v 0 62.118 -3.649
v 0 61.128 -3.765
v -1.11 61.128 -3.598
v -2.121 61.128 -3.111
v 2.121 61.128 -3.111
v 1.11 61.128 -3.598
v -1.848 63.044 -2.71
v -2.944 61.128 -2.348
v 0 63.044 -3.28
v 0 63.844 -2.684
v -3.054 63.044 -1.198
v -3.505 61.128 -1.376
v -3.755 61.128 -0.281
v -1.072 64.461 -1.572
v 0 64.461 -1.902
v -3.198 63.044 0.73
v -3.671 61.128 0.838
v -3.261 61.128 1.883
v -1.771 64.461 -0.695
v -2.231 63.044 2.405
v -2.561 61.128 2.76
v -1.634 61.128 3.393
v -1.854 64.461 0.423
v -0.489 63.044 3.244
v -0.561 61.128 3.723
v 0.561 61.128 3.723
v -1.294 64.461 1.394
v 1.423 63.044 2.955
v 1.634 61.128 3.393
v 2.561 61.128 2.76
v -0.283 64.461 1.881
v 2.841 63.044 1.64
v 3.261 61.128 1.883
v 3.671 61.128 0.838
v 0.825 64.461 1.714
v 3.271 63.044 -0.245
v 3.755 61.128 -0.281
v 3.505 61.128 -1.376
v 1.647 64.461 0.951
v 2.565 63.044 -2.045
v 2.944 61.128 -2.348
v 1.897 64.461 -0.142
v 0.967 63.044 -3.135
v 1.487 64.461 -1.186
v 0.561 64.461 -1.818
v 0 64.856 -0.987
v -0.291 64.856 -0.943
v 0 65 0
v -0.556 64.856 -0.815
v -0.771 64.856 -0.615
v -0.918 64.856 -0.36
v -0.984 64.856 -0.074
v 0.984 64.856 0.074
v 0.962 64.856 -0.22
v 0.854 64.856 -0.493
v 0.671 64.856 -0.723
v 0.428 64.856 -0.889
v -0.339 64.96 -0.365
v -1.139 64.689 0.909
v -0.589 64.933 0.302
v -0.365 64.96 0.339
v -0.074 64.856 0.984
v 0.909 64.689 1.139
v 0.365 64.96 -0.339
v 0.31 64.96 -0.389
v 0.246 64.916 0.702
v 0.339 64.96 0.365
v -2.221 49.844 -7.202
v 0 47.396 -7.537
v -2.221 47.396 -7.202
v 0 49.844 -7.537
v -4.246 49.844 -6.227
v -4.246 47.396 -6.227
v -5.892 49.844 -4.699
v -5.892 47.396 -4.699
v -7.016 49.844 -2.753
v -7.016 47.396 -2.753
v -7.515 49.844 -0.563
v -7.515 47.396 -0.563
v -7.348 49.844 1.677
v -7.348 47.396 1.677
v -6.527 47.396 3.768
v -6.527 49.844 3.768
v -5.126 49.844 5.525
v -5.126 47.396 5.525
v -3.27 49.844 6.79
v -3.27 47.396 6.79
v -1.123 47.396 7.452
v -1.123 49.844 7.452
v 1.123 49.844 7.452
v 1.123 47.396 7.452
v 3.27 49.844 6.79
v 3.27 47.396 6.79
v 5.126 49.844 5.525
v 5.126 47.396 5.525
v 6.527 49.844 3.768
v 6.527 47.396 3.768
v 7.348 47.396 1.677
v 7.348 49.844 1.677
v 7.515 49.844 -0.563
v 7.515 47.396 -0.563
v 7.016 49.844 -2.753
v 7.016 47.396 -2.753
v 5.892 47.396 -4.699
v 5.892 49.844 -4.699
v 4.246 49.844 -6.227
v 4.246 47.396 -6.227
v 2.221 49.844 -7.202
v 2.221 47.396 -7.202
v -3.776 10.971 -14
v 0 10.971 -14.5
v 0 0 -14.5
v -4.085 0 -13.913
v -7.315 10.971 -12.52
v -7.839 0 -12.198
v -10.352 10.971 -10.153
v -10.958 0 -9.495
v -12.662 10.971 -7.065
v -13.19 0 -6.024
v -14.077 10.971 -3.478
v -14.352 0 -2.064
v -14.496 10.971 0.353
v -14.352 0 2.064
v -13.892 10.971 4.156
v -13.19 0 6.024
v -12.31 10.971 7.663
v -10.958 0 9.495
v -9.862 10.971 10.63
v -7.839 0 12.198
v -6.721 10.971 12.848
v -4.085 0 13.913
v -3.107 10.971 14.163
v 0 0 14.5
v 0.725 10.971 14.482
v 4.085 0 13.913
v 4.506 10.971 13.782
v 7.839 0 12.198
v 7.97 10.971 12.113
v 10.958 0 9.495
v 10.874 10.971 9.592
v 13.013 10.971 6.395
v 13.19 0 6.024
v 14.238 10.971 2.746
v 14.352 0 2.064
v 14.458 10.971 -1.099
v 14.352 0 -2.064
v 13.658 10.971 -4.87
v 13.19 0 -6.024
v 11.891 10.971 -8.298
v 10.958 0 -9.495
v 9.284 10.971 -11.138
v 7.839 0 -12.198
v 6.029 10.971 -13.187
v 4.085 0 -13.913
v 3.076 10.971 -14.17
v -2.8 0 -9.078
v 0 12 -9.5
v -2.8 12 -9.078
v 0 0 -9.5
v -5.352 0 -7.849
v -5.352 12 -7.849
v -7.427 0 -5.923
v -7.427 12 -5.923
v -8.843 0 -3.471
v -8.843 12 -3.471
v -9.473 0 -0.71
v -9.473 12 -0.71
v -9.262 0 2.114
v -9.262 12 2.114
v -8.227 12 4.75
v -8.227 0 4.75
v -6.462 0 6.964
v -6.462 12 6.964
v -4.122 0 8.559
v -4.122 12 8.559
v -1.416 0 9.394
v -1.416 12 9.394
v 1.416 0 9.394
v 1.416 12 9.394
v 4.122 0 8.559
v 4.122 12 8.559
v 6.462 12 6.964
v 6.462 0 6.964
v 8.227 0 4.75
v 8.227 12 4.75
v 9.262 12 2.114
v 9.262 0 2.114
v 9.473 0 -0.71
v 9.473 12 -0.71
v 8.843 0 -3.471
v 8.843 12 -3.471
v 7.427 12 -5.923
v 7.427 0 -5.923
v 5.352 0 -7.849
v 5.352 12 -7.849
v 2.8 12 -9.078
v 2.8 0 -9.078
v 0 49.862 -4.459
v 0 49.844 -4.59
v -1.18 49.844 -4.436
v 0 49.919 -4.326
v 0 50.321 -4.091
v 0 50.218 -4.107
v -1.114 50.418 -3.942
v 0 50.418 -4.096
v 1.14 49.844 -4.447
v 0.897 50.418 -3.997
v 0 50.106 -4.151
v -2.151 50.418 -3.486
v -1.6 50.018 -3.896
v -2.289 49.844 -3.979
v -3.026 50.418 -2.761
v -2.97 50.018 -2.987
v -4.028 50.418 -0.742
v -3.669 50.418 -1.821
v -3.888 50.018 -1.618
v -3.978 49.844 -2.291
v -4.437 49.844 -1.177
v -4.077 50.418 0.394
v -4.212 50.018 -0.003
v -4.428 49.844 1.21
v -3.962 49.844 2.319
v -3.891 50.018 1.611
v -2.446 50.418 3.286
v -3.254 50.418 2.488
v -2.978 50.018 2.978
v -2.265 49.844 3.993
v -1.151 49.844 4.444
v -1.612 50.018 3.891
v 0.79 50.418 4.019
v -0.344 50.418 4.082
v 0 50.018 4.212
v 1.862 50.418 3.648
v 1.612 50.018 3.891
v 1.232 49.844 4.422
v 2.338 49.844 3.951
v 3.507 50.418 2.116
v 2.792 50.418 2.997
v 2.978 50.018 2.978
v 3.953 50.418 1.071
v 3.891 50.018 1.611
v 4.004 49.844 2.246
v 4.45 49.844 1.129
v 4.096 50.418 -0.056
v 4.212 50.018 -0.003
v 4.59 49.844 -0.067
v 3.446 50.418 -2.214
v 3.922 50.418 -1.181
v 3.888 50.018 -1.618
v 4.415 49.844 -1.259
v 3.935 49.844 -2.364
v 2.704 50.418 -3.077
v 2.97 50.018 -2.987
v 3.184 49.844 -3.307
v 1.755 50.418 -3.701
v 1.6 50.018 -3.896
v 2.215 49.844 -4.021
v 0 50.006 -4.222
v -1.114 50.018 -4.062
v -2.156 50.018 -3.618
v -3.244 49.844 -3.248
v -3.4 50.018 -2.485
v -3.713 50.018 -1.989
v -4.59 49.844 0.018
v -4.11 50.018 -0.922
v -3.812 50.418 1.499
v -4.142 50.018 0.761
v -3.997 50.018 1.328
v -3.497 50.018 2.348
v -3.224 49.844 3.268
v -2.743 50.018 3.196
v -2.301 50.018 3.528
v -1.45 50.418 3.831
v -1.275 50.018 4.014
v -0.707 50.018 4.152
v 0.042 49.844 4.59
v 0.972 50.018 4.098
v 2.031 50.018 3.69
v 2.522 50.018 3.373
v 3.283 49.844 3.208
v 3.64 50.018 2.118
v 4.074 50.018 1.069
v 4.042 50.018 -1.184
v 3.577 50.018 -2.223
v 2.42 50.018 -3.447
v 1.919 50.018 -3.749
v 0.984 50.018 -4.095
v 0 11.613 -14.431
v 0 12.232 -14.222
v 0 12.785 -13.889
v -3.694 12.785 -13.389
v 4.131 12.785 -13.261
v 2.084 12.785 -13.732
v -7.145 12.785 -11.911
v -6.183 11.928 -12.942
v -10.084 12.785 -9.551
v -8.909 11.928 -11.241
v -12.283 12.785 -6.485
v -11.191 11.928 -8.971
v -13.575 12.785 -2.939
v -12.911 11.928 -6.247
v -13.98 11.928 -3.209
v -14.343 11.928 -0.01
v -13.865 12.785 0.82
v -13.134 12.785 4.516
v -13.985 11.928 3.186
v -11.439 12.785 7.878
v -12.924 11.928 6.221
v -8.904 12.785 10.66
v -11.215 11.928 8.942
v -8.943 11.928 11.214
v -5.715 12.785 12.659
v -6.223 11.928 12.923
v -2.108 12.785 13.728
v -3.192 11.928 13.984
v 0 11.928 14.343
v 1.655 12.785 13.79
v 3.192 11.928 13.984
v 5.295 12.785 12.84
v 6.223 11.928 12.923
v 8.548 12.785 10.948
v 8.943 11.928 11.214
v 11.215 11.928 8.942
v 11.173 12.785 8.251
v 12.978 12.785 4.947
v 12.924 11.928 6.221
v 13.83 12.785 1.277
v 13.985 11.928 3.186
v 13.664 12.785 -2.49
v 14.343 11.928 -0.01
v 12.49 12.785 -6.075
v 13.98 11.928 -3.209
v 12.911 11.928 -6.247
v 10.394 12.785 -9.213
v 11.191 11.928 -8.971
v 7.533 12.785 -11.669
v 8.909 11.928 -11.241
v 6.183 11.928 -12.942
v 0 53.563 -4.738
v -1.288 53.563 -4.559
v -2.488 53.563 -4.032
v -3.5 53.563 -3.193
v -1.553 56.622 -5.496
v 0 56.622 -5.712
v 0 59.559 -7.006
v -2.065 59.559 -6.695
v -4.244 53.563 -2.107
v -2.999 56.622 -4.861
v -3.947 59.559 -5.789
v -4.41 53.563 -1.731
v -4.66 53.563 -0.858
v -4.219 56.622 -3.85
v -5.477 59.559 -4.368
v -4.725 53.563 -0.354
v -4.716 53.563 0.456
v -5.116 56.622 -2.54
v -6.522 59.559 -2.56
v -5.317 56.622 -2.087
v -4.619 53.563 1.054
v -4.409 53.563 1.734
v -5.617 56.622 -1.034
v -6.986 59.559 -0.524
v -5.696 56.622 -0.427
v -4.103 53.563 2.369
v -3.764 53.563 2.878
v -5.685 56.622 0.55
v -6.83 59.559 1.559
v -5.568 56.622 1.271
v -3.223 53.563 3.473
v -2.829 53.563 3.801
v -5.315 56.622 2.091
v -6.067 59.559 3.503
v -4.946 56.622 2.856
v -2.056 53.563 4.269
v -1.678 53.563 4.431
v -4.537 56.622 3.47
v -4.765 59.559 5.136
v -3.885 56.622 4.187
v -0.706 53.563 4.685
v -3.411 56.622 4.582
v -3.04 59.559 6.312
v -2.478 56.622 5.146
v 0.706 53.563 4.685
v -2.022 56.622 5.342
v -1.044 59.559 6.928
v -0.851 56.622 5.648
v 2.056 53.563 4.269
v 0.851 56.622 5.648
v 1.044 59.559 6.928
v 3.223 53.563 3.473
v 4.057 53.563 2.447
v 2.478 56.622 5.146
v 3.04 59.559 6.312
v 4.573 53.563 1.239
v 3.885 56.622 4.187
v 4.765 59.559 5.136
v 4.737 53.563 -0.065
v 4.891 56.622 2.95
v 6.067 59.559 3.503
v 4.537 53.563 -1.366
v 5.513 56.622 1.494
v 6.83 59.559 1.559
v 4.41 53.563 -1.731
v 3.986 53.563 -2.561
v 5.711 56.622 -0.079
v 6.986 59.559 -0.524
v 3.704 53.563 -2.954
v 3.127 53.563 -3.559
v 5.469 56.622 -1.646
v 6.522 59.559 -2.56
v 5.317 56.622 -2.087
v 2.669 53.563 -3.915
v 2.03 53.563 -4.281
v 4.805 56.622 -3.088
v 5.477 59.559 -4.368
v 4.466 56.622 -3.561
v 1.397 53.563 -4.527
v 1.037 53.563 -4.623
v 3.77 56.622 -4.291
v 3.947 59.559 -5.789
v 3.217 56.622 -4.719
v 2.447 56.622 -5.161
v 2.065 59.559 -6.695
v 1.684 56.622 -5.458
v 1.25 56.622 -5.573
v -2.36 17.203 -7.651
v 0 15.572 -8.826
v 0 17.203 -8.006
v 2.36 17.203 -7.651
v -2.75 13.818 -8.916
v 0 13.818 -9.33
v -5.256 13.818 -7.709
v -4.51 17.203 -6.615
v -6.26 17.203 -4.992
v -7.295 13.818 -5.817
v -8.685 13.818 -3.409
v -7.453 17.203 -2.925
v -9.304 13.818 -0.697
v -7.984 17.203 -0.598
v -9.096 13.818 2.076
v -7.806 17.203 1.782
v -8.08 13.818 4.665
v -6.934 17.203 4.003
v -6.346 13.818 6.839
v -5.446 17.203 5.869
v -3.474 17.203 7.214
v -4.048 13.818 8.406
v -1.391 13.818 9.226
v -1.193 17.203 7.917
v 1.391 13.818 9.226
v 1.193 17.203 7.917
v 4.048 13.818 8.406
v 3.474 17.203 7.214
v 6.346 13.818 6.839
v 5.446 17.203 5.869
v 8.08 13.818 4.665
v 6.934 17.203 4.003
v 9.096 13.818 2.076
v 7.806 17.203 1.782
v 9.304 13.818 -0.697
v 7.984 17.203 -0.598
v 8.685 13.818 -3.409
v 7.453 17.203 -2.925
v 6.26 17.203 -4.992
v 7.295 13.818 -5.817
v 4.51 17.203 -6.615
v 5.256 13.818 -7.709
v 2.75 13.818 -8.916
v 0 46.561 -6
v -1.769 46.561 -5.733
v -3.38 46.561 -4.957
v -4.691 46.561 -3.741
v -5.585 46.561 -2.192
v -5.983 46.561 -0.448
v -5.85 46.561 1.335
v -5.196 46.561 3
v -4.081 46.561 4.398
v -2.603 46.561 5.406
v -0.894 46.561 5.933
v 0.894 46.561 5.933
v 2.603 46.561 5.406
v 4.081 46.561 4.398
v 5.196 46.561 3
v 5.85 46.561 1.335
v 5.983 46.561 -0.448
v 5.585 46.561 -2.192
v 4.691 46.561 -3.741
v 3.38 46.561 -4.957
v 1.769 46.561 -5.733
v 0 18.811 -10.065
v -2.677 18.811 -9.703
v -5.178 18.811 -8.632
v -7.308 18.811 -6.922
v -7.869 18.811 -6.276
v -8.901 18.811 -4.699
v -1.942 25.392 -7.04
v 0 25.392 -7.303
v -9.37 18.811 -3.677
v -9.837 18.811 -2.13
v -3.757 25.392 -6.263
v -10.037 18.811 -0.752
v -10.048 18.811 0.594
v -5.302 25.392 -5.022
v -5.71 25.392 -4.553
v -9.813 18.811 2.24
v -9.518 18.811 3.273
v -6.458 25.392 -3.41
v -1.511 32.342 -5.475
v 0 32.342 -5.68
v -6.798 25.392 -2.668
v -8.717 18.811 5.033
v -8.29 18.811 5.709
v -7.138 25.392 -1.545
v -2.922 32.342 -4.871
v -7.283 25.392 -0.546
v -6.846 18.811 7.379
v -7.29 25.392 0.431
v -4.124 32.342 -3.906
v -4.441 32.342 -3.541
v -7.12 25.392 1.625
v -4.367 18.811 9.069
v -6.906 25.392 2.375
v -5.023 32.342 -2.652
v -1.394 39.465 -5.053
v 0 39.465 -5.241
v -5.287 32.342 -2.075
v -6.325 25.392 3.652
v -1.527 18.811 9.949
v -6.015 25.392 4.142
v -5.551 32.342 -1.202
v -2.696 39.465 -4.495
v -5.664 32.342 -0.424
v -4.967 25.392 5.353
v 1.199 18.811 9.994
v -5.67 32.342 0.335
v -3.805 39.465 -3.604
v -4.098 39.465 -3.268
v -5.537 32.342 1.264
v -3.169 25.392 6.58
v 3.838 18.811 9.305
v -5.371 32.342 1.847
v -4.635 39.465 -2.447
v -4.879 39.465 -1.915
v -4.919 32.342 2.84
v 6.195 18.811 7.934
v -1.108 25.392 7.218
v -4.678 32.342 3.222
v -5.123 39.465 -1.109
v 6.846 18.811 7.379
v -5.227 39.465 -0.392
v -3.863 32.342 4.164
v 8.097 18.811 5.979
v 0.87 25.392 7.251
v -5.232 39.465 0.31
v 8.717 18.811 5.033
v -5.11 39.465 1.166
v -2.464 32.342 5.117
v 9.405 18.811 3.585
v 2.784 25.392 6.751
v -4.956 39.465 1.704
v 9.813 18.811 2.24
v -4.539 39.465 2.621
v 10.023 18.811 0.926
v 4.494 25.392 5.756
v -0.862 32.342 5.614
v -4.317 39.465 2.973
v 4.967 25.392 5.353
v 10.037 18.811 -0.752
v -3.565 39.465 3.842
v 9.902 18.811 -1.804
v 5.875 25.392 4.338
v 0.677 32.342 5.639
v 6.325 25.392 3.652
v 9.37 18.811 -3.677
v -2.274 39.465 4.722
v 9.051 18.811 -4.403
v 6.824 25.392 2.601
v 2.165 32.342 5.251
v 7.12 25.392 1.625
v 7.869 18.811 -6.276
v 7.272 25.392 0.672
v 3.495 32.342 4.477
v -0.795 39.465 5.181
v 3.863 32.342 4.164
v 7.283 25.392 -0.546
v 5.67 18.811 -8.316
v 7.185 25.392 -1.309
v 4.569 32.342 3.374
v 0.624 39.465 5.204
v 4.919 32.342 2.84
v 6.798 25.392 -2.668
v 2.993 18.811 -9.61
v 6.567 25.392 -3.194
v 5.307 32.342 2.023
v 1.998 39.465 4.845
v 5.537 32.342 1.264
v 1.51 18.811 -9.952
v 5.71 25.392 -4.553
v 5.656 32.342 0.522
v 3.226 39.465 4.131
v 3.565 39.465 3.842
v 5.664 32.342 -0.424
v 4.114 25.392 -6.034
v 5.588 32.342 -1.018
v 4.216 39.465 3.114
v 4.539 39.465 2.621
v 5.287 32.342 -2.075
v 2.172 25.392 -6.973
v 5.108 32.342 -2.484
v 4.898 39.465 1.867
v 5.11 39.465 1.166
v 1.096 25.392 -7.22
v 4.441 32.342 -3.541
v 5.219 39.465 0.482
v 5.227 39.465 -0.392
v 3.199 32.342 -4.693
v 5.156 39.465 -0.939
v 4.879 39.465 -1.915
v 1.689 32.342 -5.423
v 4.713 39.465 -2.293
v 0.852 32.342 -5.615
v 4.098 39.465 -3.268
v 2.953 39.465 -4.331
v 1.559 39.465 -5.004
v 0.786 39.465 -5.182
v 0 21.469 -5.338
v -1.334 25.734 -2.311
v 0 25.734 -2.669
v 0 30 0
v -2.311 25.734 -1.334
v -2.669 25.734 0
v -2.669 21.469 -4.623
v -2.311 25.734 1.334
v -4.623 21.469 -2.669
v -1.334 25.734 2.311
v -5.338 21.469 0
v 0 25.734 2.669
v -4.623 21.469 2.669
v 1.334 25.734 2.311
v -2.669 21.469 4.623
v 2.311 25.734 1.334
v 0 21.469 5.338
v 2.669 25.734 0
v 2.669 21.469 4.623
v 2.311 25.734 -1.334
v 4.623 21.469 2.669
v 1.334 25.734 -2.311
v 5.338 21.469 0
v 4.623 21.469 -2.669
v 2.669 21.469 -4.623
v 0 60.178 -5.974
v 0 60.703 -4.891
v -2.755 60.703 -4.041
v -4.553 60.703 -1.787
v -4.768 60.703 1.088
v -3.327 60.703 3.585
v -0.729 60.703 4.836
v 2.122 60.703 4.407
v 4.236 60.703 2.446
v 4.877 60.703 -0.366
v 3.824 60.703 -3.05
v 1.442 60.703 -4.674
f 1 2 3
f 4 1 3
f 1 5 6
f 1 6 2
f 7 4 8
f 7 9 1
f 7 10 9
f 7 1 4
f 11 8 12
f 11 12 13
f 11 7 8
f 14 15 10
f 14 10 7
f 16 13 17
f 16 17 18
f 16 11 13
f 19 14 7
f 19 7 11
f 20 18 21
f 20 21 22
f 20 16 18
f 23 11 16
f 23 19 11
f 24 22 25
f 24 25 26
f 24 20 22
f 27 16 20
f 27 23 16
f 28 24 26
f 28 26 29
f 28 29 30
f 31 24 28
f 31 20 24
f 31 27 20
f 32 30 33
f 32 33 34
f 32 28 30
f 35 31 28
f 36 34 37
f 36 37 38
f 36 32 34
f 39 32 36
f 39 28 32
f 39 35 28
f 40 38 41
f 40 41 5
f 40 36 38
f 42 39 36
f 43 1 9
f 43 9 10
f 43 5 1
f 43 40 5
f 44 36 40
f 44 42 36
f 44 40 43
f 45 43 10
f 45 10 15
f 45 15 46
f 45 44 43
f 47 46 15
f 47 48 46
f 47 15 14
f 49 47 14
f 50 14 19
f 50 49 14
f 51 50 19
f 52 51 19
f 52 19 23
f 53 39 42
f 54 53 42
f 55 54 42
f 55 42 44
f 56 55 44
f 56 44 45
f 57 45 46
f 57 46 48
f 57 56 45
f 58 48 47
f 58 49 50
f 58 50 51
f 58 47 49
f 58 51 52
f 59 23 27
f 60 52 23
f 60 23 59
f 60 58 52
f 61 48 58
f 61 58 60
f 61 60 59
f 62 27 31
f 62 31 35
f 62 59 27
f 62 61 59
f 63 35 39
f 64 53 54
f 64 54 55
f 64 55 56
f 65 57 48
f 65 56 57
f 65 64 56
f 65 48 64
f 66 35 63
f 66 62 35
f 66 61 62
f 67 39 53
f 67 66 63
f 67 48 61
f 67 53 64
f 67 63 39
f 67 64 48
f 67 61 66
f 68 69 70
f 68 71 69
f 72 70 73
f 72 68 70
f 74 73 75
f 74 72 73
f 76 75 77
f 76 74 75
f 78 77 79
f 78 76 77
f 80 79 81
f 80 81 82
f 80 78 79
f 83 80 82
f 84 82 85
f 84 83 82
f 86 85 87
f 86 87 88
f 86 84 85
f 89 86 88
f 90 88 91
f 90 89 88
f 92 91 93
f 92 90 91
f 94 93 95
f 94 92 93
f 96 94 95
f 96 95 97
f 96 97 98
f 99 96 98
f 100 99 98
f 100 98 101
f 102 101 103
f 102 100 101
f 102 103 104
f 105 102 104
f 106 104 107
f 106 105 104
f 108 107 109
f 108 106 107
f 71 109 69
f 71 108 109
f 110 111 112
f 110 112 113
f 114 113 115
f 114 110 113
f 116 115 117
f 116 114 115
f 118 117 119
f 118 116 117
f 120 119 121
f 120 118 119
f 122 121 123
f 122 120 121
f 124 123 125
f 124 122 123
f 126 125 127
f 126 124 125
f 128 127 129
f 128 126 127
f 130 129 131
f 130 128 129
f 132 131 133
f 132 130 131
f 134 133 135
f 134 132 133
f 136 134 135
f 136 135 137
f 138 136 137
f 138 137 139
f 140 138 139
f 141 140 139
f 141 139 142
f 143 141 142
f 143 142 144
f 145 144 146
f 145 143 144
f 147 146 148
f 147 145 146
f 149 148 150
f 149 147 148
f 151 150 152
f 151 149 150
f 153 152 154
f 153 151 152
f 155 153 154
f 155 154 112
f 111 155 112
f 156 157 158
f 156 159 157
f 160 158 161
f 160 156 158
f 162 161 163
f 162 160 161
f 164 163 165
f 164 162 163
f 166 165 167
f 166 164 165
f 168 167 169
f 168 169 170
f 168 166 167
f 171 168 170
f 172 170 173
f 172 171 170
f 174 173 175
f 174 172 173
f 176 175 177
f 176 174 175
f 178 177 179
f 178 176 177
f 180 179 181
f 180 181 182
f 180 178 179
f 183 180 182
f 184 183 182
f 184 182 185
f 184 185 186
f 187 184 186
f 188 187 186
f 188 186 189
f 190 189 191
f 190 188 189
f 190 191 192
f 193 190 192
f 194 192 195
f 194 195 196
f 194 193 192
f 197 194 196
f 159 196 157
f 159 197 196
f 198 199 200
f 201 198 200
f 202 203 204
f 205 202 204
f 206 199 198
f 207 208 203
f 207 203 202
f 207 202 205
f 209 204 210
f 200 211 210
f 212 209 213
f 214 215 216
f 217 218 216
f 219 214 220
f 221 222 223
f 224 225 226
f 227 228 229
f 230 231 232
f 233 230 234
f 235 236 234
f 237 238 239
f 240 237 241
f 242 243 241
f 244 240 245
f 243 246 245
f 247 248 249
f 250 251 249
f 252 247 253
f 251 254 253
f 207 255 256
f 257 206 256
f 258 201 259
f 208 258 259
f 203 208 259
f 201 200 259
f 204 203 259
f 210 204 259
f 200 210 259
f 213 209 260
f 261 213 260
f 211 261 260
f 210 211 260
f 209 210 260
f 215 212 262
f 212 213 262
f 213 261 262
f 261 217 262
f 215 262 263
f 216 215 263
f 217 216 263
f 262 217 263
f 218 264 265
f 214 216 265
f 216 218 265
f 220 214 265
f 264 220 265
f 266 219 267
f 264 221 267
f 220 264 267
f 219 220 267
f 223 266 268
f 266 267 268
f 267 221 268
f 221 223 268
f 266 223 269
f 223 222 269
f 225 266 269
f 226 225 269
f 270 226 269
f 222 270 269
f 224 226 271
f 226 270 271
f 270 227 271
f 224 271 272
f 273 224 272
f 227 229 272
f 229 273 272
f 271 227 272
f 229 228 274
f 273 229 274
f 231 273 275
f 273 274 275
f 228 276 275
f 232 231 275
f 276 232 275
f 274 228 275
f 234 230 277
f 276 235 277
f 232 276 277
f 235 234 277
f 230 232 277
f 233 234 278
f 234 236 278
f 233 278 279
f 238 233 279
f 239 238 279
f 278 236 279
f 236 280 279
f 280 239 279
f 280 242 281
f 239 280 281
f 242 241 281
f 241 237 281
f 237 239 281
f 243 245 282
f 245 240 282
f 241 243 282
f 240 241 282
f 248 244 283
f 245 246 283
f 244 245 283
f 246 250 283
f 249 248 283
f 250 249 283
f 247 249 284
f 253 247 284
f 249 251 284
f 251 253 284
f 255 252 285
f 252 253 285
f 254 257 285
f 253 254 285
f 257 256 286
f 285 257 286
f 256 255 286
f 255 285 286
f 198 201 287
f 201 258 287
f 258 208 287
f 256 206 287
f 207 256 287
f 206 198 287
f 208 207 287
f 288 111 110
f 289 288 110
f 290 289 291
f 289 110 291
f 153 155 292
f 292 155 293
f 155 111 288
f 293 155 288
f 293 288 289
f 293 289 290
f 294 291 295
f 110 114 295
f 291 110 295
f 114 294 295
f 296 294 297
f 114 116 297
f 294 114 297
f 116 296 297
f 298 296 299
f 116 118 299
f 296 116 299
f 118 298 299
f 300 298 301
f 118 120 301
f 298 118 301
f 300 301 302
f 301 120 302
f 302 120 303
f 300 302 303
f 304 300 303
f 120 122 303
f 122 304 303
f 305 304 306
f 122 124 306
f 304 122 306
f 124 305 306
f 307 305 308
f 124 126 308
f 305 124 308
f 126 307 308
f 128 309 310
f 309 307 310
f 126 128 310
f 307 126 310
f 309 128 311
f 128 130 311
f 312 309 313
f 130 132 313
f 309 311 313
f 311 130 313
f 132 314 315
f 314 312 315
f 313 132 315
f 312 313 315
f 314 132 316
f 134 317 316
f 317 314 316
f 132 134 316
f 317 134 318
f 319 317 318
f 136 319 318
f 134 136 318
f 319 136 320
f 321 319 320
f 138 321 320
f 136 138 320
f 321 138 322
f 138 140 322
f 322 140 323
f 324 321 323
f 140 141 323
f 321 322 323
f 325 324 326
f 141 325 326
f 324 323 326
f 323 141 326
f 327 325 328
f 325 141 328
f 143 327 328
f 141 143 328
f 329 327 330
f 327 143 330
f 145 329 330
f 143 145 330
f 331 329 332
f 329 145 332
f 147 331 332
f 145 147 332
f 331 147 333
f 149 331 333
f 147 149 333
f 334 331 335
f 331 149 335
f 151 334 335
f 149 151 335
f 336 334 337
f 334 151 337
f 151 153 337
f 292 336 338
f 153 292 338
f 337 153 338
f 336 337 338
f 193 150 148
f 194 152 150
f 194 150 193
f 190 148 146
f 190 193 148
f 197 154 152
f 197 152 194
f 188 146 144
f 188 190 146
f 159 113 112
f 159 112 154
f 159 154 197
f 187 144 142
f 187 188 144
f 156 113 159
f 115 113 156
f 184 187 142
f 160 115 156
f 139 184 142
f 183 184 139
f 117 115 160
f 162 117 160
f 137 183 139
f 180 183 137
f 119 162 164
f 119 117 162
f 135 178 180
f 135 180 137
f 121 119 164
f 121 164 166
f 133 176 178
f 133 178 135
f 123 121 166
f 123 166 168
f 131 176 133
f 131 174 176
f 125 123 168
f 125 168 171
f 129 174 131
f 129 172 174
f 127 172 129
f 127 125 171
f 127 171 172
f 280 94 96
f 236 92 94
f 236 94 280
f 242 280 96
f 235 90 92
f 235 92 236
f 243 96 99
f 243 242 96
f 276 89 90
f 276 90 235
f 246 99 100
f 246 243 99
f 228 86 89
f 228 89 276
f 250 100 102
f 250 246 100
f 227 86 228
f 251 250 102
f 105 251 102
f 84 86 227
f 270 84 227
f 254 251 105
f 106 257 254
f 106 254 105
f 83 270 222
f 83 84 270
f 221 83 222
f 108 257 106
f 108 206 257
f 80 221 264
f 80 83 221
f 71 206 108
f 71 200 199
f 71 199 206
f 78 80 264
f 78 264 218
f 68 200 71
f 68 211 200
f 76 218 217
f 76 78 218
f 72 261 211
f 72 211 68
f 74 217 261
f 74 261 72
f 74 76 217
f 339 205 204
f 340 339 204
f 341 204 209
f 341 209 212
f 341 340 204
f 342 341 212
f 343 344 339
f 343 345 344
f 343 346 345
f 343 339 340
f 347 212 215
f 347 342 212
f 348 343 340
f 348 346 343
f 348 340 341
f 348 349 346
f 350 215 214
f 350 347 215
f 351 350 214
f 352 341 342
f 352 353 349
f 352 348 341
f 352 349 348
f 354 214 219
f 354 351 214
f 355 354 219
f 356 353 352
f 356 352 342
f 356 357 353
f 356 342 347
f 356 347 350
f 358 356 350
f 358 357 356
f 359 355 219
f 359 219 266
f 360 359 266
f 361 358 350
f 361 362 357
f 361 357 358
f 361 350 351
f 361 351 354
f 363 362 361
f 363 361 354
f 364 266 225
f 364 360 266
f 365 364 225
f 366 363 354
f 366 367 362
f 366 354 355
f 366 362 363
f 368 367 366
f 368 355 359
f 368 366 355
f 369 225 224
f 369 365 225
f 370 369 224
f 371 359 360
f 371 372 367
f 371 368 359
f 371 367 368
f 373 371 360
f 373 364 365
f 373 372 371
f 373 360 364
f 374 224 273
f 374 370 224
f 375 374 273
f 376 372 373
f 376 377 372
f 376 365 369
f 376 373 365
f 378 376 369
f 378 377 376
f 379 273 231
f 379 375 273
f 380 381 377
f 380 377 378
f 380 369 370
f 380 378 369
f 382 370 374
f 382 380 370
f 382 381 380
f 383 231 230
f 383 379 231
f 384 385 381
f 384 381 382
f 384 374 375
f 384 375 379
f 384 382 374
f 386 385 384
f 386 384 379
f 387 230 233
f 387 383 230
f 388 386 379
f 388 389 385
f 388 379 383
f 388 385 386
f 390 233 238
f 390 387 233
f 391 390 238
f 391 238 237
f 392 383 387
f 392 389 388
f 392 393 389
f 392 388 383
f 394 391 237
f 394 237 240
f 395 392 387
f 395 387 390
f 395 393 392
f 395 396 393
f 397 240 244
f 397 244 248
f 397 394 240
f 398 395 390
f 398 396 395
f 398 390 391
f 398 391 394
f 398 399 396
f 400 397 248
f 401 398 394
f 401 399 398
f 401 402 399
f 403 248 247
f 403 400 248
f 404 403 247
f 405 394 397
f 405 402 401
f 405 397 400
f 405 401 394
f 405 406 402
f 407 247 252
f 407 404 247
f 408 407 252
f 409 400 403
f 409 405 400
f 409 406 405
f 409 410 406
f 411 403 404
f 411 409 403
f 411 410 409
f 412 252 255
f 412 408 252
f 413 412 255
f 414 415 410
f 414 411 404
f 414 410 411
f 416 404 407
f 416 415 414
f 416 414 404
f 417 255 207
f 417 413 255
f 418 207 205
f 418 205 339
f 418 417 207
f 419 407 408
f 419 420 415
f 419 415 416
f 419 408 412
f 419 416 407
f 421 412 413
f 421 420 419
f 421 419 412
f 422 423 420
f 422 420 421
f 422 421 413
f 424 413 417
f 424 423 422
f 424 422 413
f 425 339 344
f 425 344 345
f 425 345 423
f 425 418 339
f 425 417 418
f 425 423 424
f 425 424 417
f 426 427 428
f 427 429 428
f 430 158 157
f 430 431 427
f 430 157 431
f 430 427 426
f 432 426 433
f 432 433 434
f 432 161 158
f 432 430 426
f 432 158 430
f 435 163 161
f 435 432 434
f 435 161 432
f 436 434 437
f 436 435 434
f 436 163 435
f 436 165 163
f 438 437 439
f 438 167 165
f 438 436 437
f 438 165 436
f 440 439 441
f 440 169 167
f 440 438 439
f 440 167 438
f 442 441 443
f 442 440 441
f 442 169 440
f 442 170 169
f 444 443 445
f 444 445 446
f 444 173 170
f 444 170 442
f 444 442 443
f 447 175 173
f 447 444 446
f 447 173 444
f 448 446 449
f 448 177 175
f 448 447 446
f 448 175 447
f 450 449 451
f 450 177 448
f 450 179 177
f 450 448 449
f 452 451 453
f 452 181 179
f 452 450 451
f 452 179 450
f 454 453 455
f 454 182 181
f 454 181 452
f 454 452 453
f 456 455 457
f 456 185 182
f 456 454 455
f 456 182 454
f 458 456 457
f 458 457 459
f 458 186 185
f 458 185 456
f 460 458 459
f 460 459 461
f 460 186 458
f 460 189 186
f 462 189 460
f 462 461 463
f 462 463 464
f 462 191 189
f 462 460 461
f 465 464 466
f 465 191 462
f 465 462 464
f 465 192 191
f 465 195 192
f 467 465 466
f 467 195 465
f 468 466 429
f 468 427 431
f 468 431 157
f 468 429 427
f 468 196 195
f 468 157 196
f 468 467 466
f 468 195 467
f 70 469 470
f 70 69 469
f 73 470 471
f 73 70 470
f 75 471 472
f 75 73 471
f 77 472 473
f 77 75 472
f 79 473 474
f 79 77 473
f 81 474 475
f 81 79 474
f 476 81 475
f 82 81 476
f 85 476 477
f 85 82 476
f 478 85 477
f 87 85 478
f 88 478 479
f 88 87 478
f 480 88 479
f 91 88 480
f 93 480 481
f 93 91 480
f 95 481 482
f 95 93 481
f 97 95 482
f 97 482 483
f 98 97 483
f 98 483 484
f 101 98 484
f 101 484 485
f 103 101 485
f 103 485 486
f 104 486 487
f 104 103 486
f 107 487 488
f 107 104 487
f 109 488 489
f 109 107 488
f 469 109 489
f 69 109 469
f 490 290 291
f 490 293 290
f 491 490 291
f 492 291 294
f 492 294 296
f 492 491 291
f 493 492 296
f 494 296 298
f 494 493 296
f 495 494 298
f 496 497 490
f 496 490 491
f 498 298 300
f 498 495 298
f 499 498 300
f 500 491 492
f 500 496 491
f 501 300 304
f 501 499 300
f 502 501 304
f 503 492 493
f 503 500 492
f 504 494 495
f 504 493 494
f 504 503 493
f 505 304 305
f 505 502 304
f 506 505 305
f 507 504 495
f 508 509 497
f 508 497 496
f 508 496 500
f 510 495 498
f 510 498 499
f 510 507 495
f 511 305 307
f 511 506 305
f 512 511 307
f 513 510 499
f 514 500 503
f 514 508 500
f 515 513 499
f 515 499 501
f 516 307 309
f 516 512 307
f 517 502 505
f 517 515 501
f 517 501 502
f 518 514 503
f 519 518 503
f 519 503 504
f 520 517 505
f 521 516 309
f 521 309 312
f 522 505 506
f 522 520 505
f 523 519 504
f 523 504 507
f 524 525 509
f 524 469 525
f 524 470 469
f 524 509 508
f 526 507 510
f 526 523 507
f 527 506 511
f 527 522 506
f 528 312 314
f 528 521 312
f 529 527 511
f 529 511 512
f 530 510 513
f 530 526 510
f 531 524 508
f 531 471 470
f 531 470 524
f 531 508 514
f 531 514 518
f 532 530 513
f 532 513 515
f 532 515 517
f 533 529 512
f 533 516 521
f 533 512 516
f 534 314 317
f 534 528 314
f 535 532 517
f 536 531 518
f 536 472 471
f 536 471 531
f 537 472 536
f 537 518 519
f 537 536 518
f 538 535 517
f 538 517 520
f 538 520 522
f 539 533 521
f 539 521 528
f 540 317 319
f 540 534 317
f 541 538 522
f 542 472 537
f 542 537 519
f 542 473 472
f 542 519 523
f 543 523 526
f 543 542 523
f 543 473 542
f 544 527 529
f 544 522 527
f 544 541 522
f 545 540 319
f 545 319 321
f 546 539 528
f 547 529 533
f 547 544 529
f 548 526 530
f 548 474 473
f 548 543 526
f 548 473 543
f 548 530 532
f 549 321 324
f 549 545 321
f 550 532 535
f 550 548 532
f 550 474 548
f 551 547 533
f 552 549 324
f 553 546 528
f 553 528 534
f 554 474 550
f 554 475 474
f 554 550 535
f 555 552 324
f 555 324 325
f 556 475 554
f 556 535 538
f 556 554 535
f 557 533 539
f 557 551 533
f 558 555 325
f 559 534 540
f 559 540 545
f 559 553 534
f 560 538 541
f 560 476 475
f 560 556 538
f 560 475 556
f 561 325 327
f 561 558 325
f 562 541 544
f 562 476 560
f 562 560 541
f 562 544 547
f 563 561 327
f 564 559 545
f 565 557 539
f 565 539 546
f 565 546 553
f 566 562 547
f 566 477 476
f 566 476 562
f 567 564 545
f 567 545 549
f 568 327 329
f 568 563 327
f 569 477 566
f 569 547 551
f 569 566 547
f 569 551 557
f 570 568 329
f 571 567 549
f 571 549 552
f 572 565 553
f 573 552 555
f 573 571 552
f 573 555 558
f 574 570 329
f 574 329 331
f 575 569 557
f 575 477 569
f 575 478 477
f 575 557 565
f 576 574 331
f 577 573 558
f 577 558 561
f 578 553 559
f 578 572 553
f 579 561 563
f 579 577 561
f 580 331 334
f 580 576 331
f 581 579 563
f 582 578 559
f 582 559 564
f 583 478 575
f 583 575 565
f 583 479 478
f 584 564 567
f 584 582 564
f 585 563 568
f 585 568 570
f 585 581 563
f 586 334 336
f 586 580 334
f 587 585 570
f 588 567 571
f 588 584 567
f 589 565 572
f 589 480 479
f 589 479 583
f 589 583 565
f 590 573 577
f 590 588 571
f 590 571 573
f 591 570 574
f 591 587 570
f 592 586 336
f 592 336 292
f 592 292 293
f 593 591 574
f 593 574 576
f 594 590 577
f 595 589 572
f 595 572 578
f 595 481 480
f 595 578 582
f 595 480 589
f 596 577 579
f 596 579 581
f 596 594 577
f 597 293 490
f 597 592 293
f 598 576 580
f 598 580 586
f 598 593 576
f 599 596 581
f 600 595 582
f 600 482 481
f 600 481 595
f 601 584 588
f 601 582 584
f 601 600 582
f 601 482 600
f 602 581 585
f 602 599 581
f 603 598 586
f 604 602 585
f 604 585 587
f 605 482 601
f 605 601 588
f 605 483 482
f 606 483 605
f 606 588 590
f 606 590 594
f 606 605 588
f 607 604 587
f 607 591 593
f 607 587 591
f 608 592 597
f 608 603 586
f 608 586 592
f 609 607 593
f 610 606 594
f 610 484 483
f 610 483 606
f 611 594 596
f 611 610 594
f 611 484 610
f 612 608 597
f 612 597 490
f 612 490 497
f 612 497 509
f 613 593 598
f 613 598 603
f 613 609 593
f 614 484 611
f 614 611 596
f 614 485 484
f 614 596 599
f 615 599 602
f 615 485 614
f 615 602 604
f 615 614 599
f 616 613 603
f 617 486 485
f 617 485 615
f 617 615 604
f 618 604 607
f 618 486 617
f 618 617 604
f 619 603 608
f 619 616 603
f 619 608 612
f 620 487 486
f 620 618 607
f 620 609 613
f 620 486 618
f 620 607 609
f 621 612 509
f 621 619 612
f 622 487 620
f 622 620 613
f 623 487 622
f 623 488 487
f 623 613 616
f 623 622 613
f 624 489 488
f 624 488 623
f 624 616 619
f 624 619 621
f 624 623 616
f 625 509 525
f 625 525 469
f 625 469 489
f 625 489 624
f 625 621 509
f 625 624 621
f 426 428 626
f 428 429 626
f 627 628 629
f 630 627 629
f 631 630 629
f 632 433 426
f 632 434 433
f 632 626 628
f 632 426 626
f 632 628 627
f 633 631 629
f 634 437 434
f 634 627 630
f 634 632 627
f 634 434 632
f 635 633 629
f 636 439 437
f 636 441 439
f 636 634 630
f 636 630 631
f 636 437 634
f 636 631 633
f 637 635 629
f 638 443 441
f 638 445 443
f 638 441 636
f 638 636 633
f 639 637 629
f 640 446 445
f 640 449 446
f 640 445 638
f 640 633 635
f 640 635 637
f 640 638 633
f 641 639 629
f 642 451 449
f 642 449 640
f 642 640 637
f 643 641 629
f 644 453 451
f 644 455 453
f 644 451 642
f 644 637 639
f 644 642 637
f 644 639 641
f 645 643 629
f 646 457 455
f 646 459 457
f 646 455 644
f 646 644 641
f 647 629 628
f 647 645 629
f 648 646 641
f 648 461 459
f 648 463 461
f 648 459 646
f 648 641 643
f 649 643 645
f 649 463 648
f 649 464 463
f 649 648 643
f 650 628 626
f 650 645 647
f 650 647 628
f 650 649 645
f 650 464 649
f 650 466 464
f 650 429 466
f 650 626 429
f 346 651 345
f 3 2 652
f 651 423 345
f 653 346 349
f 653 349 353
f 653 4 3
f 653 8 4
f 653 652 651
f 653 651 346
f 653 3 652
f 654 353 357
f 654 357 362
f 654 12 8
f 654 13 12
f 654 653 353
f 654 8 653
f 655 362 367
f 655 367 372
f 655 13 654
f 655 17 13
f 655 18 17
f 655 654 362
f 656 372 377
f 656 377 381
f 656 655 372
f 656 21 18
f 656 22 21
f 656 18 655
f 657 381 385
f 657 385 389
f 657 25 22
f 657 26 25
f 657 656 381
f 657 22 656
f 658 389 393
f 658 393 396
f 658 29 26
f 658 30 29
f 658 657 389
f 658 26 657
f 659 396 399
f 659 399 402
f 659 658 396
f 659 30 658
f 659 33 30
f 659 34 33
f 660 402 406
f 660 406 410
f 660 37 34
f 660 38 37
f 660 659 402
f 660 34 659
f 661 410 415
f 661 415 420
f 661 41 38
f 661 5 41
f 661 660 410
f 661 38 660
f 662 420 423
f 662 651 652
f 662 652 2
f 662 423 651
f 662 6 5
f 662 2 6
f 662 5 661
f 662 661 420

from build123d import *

# Parameters (mm, degrees)
FILLET1_R = 3
FILLET2_R = 0.5


with BuildPart() as part:
    # Sketch1 → Revolve2 (revolve)
    with BuildSketch(Plane.XY, mode=Mode.PRIVATE) as revolve2_sk:
        with BuildLine():
            Line((9.5, 12), (9.5, 0))
            Line((9.5, 0), (14.5, 0))
            Line((14.5, 0), (14.5, 12))
            ThreePointArc((14.5, 12), (6.46129463, 28.348941445), (6, 46.56146125))
            Line((6, 46.56146125), (7.536573788, 47.396000215))
            Line((7.536573788, 47.396000215), (7.536573788, 49.844035403))
            Line((7.536573788, 49.844035403), (4.016092882, 49.844035403))
            ThreePointArc((4.016092882, 49.844035403), (5.09741657, 54.8289558), (7.005928337, 59.559312565))
            ThreePointArc((7.005928337, 59.559312565), (5.43849666, 60.452627999), (3.765468303, 61.127780309))
            ThreePointArc((3.765468303, 61.127780309), (2.684487968, 63.843540801), (0, 65))
            Line((0, 65), (0, 30))
            Line((0, 30), (8.006428895, 17.203147345))
            ThreePointArc((8.006428895, 17.203147345), (9.11921693, 14.706635224), (9.5, 12))
        make_face()
    revolve(revolve2_sk.sketch.rotate(Axis((0, 0, 0), (0, 1, 0)), 90), axis=Axis((0, 0, 0), (0, 1, 0)))

    # Fillet1
    fillet1_edges = [part.edges().sort_by_distance(p)[0] for p in [
        (0, 12, 14.5),
    ]]
    fillet(fillet1_edges, radius=FILLET1_R)

    # Fillet2
    fillet2_edges = [part.edges().sort_by_distance(p)[0] for p in [
        (0, 49.844035403, 4.016092882),
    ]]
    fillet(fillet2_edges, radius=FILLET2_R)


solid = part.part
